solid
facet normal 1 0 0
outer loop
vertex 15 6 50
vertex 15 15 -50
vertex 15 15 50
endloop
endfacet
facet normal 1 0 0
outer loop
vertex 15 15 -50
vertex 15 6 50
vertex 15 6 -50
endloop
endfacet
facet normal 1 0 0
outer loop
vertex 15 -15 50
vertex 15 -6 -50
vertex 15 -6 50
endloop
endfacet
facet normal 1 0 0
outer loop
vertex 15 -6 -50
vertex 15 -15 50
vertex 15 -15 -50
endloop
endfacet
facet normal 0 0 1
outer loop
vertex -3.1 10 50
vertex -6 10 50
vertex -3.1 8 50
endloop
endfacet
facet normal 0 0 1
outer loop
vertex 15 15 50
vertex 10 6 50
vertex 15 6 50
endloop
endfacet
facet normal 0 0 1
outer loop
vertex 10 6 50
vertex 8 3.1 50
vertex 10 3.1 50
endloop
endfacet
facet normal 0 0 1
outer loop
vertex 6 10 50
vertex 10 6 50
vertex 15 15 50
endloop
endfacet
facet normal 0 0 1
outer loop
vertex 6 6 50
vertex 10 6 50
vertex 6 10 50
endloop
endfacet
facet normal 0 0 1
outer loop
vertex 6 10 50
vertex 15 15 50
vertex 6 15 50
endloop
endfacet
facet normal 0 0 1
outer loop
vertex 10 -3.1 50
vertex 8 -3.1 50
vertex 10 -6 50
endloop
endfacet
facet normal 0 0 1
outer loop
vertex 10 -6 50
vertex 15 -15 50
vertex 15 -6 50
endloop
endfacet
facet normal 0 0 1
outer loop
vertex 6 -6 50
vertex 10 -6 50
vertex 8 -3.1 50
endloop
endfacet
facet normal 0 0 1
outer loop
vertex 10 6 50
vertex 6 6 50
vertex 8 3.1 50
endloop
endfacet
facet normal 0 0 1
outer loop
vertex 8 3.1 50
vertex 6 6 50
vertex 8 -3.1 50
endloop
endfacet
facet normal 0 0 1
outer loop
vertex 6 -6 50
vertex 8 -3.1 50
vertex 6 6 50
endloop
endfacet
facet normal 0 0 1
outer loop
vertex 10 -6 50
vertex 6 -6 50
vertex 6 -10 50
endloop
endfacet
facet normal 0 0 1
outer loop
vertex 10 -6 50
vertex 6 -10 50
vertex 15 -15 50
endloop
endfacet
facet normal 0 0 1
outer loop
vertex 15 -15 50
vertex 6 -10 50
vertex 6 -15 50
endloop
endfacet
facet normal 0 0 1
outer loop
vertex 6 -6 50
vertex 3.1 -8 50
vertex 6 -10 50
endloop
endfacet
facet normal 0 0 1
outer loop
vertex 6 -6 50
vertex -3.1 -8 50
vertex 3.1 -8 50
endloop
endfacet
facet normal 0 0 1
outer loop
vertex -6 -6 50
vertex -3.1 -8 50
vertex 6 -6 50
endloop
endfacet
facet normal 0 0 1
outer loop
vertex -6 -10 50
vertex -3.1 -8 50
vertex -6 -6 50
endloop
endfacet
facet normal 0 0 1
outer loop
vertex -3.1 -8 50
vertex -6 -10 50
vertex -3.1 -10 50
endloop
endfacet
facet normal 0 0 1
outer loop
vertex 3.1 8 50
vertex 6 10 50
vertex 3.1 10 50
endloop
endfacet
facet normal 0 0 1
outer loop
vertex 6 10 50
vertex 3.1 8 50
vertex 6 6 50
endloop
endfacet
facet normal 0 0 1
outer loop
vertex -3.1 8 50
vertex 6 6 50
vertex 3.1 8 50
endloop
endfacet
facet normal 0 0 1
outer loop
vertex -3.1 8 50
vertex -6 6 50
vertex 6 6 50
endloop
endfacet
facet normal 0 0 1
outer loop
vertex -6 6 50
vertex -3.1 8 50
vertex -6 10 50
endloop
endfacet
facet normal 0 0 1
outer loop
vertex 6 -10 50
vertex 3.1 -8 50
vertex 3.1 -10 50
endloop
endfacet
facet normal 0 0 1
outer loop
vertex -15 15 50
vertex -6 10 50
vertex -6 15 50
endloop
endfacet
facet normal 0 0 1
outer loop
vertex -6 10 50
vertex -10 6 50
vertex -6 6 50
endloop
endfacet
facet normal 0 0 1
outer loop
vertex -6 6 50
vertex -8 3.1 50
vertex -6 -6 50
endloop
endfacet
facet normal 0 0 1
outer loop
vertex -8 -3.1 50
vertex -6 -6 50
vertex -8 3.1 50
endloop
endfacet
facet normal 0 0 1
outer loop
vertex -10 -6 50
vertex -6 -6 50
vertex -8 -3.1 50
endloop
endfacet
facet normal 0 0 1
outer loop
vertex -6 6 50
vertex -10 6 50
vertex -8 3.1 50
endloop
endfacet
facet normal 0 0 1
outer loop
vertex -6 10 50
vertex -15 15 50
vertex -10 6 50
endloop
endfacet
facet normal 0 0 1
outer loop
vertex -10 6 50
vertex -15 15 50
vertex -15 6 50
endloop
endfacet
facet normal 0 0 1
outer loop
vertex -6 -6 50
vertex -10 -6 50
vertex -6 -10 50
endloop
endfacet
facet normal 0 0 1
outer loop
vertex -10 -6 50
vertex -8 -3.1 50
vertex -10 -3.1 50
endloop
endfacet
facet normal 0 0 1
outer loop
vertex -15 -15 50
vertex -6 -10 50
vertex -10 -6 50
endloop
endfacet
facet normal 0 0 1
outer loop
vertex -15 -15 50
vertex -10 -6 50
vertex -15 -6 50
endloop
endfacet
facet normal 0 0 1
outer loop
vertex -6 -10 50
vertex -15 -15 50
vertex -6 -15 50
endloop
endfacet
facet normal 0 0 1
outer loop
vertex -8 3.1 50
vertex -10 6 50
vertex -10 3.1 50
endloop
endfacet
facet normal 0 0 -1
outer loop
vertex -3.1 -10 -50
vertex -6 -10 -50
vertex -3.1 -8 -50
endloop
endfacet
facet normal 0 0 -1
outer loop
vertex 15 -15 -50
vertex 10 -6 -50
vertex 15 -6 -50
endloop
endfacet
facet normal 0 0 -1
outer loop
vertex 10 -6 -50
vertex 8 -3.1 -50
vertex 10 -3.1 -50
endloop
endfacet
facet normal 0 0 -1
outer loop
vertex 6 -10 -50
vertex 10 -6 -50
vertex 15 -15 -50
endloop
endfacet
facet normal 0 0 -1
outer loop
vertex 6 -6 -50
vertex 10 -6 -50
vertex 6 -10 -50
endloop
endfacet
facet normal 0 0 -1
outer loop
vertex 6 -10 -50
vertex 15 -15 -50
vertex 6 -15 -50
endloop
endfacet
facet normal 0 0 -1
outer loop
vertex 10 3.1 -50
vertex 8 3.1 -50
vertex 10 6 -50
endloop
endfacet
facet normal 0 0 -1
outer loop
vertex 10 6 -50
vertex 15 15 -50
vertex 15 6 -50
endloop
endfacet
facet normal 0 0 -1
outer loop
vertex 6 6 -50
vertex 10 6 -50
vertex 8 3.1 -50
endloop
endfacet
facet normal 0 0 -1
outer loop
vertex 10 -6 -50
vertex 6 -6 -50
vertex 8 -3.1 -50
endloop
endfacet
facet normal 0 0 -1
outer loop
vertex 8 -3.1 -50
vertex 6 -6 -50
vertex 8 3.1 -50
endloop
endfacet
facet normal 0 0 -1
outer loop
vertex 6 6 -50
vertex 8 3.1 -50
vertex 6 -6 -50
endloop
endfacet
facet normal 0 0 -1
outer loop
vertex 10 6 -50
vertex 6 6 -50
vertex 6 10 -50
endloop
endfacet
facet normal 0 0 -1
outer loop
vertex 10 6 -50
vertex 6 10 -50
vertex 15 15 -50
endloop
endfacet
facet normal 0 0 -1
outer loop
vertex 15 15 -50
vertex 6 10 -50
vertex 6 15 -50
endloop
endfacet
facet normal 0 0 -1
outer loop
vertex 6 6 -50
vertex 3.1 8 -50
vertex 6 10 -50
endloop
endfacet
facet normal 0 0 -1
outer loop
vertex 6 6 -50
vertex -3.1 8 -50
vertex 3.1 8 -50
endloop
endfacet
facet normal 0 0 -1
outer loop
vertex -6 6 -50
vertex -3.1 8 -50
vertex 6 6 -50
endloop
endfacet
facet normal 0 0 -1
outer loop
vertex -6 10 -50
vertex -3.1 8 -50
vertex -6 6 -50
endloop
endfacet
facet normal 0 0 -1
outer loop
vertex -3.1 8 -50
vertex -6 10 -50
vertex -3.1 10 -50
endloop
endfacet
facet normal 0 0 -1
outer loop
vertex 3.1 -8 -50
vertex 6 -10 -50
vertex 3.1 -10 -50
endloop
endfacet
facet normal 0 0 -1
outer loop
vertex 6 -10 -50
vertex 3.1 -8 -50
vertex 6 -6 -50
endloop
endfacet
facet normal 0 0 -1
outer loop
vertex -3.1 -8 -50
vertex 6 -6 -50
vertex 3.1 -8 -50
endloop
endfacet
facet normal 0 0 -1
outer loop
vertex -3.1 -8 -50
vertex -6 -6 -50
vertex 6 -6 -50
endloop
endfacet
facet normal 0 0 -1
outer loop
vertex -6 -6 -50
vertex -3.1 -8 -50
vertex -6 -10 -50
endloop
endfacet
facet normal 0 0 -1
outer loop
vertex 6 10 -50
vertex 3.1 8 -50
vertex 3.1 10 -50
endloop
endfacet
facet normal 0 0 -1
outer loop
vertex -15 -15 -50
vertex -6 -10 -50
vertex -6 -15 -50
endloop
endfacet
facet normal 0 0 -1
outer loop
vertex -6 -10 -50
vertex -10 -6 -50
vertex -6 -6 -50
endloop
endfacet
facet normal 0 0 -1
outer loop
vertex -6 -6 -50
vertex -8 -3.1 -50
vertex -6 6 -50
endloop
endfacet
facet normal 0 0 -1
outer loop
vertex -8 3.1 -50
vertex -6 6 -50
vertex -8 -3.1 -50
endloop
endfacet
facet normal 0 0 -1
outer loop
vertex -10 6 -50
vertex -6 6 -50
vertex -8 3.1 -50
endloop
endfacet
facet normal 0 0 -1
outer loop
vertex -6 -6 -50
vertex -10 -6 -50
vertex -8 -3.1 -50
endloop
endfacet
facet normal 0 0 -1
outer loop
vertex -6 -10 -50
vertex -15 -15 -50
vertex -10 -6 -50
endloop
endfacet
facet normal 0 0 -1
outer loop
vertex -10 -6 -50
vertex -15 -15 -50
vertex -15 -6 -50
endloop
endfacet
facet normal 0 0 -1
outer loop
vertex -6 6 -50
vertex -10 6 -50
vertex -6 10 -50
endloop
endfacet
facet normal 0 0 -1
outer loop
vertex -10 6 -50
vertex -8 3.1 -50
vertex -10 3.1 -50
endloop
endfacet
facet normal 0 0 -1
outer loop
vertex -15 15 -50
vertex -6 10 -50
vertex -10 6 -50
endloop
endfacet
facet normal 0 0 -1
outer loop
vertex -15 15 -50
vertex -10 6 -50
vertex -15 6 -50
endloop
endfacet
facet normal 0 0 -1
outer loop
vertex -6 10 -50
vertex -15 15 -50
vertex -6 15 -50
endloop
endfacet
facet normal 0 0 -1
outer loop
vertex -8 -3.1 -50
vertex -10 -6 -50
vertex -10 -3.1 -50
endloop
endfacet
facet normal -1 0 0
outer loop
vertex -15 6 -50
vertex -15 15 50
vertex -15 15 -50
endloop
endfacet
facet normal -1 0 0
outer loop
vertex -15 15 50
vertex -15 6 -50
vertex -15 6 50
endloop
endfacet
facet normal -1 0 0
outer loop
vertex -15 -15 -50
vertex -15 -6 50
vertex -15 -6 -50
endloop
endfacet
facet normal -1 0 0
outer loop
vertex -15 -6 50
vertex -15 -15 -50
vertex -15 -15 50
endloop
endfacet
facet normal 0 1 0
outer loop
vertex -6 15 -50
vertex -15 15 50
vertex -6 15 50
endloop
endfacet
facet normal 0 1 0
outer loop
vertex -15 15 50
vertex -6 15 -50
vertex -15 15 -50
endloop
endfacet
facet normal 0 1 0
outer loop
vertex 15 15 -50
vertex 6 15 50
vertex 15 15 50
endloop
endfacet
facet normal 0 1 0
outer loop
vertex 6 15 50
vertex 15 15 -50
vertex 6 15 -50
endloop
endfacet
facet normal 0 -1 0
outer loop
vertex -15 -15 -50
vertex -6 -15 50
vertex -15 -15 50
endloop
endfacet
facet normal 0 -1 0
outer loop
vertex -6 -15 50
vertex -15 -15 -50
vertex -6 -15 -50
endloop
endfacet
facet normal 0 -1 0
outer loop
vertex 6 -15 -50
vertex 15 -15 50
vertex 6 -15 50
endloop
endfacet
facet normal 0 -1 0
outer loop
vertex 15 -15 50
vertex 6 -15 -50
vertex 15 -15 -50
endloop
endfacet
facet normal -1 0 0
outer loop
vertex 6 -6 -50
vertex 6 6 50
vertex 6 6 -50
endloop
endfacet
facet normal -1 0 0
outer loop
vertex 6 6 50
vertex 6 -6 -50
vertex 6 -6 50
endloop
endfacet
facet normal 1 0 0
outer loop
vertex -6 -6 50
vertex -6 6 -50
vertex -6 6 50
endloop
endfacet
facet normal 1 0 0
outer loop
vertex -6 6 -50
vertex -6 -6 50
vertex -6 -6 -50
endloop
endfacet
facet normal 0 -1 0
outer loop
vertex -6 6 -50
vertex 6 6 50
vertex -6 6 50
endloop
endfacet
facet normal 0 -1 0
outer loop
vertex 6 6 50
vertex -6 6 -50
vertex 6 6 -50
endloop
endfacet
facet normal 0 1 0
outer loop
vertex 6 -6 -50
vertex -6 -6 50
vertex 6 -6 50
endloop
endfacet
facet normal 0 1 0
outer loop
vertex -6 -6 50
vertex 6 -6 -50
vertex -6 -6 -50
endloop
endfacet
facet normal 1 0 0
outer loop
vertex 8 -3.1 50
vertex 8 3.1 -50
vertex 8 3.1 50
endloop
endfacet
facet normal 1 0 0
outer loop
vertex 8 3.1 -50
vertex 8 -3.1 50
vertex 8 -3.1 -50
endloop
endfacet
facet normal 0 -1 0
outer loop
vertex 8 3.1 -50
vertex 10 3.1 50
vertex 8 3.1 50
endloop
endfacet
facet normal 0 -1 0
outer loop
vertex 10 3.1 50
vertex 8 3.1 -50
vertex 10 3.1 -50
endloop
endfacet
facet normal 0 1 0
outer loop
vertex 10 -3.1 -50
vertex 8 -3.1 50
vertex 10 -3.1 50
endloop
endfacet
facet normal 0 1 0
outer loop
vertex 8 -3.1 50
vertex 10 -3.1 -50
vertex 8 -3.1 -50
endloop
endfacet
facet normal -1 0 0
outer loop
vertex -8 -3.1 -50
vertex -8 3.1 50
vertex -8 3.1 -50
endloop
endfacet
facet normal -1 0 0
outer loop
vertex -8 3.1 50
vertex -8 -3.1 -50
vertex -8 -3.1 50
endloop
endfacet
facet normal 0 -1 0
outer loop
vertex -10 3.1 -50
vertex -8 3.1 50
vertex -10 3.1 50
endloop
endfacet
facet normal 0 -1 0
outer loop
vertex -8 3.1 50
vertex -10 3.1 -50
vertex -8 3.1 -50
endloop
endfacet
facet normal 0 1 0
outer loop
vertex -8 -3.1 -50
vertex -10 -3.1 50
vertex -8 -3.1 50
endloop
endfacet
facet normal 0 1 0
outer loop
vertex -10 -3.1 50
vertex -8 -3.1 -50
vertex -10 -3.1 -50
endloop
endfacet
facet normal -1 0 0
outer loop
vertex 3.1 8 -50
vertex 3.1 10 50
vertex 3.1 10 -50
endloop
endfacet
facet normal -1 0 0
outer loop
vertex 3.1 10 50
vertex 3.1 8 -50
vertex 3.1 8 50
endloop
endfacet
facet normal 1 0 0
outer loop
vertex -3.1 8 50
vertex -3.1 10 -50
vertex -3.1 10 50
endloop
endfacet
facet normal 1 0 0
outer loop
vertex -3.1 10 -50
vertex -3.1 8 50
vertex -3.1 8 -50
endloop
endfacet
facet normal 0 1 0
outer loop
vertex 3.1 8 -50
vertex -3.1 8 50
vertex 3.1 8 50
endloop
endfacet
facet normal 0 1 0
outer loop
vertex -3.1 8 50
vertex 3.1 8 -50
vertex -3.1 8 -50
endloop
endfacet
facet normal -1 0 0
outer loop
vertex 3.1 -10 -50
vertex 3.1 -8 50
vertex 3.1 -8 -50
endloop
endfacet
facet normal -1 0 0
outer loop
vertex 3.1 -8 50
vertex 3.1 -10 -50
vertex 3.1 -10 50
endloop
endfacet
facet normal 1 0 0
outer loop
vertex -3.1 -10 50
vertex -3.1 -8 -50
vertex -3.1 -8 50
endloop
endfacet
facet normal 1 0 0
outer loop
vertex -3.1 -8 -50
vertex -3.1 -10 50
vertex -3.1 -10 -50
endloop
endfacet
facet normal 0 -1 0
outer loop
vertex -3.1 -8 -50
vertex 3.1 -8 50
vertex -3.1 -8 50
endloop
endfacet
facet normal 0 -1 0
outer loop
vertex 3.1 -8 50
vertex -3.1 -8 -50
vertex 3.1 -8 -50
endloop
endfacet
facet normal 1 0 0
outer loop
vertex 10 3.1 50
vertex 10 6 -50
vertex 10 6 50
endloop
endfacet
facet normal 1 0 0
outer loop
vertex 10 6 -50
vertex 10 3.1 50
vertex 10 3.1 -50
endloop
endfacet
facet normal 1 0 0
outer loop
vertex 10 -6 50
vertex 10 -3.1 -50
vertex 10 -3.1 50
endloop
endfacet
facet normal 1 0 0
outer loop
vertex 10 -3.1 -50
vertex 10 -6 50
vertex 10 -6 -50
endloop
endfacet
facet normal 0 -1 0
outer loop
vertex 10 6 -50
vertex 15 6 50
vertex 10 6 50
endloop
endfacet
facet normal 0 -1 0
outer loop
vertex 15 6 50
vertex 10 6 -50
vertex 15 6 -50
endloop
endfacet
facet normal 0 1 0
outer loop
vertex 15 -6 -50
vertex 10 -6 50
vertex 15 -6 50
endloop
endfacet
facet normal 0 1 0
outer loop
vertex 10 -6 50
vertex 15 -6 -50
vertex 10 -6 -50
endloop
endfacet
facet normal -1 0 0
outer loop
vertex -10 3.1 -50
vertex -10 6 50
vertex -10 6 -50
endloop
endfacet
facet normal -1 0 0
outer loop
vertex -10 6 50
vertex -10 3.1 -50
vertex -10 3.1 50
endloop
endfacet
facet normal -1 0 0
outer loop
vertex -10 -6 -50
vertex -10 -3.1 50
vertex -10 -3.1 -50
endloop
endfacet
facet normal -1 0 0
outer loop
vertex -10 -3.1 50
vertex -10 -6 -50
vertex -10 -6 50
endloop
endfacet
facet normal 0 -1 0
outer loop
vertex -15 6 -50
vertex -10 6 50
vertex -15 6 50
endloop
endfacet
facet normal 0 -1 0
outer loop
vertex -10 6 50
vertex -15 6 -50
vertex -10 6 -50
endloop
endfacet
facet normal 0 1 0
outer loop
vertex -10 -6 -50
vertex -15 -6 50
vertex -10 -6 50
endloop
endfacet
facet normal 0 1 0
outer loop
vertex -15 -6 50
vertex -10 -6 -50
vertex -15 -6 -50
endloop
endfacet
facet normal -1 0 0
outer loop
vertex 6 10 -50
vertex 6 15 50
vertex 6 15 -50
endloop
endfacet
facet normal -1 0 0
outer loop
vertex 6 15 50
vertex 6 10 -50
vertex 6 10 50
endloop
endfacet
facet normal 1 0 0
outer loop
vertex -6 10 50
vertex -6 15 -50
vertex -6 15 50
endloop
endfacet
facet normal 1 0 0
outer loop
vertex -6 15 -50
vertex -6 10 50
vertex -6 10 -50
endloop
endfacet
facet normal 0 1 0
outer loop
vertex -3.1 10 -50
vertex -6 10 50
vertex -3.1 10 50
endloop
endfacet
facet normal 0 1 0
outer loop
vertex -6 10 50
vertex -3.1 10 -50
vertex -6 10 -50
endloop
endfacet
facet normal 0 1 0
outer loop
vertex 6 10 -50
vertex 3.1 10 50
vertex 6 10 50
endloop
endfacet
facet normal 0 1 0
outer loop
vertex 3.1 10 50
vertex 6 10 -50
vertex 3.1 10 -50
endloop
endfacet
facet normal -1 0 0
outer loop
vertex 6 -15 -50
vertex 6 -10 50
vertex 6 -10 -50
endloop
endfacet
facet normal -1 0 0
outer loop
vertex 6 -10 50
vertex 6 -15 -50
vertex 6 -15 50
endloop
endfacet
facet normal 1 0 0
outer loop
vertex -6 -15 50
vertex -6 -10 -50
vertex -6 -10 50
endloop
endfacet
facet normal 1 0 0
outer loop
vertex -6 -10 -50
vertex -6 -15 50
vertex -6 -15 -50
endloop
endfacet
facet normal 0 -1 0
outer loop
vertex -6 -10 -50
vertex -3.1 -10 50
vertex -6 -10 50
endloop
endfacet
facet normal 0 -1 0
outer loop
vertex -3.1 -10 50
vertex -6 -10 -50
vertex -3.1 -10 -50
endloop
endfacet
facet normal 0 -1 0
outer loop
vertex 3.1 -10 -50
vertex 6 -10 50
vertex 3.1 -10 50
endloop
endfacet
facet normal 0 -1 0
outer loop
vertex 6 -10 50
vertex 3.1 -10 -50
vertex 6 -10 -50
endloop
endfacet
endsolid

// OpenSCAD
$fn = 64;

// Aluminium extrusion profile: 30mm x 30mm cross-section, 100mm long
length = 100;
size   = 30;

// Profile parameters (approx. 3030 T-slot style)
slot_w      = 6.2;   // slot opening width at surface
slot_depth  = 7.0;   // depth of slot cut from each face
core_square = 12.0;  // central cavity size (square)
web_thick   = 2.0;   // material between core and slot pocket

module extrusion_3030(len=100, s=30) {
    // Derived pocket dimensions (kept connected by web_thick)
    pocket_w = 12.0;
    pocket_d = max(0.1, slot_depth - web_thick);

    // Small overlap to avoid coincident faces in boolean ops
    eps = 0.02;

    difference() {
        // Outer body centered at origin for reliable viewing/orientation
        translate([-s/2, -s/2, -len/2])
            cube([s, s, len], center=false);

        // Central cavity (runs full length)
        translate([-core_square/2, -core_square/2, -len/2 - eps])
            cube([core_square, core_square, len + 2*eps], center=false);

        // Four T-slot openings (one per face)
        // +X face slot
        translate([ s/2 - slot_depth, -slot_w/2, -len/2 - eps])
            cube([slot_depth + eps, slot_w, len + 2*eps], center=false);

        // -X face slot
        translate([-s/2 - eps, -slot_w/2, -len/2 - eps])
            cube([slot_depth + eps, slot_w, len + 2*eps], center=false);

        // +Y face slot
        translate([-slot_w/2,  s/2 - slot_depth, -len/2 - eps])
            cube([slot_w, slot_depth + eps, len + 2*eps], center=false);

        // -Y face slot
        translate([-slot_w/2, -s/2 - eps, -len/2 - eps])
            cube([slot_w, slot_depth + eps, len + 2*eps], center=false);

        // Relief pockets behind each slot (suggest undercut), leaving web_thick
        // +X pocket
        translate([ s/2 - pocket_d, -pocket_w/2, -len/2 - eps])
            cube([pocket_d + eps, pocket_w, len + 2*eps], center=false);

        // -X pocket
        translate([-s/2 - eps, -pocket_w/2, -len/2 - eps])
            cube([pocket_d + eps, pocket_w, len + 2*eps], center=false);

        // +Y pocket
        translate([-pocket_w/2,  s/2 - pocket_d, -len/2 - eps])
            cube([pocket_w, pocket_d + eps, len + 2*eps], center=false);

        // -Y pocket
        translate([-pocket_w/2, -s/2 - eps, -len/2 - eps])
            cube([pocket_w, pocket_d + eps, len + 2*eps], center=false);
    }
}

color([0.75, 0.78, 0.82])
extrusion_3030(length, size);
